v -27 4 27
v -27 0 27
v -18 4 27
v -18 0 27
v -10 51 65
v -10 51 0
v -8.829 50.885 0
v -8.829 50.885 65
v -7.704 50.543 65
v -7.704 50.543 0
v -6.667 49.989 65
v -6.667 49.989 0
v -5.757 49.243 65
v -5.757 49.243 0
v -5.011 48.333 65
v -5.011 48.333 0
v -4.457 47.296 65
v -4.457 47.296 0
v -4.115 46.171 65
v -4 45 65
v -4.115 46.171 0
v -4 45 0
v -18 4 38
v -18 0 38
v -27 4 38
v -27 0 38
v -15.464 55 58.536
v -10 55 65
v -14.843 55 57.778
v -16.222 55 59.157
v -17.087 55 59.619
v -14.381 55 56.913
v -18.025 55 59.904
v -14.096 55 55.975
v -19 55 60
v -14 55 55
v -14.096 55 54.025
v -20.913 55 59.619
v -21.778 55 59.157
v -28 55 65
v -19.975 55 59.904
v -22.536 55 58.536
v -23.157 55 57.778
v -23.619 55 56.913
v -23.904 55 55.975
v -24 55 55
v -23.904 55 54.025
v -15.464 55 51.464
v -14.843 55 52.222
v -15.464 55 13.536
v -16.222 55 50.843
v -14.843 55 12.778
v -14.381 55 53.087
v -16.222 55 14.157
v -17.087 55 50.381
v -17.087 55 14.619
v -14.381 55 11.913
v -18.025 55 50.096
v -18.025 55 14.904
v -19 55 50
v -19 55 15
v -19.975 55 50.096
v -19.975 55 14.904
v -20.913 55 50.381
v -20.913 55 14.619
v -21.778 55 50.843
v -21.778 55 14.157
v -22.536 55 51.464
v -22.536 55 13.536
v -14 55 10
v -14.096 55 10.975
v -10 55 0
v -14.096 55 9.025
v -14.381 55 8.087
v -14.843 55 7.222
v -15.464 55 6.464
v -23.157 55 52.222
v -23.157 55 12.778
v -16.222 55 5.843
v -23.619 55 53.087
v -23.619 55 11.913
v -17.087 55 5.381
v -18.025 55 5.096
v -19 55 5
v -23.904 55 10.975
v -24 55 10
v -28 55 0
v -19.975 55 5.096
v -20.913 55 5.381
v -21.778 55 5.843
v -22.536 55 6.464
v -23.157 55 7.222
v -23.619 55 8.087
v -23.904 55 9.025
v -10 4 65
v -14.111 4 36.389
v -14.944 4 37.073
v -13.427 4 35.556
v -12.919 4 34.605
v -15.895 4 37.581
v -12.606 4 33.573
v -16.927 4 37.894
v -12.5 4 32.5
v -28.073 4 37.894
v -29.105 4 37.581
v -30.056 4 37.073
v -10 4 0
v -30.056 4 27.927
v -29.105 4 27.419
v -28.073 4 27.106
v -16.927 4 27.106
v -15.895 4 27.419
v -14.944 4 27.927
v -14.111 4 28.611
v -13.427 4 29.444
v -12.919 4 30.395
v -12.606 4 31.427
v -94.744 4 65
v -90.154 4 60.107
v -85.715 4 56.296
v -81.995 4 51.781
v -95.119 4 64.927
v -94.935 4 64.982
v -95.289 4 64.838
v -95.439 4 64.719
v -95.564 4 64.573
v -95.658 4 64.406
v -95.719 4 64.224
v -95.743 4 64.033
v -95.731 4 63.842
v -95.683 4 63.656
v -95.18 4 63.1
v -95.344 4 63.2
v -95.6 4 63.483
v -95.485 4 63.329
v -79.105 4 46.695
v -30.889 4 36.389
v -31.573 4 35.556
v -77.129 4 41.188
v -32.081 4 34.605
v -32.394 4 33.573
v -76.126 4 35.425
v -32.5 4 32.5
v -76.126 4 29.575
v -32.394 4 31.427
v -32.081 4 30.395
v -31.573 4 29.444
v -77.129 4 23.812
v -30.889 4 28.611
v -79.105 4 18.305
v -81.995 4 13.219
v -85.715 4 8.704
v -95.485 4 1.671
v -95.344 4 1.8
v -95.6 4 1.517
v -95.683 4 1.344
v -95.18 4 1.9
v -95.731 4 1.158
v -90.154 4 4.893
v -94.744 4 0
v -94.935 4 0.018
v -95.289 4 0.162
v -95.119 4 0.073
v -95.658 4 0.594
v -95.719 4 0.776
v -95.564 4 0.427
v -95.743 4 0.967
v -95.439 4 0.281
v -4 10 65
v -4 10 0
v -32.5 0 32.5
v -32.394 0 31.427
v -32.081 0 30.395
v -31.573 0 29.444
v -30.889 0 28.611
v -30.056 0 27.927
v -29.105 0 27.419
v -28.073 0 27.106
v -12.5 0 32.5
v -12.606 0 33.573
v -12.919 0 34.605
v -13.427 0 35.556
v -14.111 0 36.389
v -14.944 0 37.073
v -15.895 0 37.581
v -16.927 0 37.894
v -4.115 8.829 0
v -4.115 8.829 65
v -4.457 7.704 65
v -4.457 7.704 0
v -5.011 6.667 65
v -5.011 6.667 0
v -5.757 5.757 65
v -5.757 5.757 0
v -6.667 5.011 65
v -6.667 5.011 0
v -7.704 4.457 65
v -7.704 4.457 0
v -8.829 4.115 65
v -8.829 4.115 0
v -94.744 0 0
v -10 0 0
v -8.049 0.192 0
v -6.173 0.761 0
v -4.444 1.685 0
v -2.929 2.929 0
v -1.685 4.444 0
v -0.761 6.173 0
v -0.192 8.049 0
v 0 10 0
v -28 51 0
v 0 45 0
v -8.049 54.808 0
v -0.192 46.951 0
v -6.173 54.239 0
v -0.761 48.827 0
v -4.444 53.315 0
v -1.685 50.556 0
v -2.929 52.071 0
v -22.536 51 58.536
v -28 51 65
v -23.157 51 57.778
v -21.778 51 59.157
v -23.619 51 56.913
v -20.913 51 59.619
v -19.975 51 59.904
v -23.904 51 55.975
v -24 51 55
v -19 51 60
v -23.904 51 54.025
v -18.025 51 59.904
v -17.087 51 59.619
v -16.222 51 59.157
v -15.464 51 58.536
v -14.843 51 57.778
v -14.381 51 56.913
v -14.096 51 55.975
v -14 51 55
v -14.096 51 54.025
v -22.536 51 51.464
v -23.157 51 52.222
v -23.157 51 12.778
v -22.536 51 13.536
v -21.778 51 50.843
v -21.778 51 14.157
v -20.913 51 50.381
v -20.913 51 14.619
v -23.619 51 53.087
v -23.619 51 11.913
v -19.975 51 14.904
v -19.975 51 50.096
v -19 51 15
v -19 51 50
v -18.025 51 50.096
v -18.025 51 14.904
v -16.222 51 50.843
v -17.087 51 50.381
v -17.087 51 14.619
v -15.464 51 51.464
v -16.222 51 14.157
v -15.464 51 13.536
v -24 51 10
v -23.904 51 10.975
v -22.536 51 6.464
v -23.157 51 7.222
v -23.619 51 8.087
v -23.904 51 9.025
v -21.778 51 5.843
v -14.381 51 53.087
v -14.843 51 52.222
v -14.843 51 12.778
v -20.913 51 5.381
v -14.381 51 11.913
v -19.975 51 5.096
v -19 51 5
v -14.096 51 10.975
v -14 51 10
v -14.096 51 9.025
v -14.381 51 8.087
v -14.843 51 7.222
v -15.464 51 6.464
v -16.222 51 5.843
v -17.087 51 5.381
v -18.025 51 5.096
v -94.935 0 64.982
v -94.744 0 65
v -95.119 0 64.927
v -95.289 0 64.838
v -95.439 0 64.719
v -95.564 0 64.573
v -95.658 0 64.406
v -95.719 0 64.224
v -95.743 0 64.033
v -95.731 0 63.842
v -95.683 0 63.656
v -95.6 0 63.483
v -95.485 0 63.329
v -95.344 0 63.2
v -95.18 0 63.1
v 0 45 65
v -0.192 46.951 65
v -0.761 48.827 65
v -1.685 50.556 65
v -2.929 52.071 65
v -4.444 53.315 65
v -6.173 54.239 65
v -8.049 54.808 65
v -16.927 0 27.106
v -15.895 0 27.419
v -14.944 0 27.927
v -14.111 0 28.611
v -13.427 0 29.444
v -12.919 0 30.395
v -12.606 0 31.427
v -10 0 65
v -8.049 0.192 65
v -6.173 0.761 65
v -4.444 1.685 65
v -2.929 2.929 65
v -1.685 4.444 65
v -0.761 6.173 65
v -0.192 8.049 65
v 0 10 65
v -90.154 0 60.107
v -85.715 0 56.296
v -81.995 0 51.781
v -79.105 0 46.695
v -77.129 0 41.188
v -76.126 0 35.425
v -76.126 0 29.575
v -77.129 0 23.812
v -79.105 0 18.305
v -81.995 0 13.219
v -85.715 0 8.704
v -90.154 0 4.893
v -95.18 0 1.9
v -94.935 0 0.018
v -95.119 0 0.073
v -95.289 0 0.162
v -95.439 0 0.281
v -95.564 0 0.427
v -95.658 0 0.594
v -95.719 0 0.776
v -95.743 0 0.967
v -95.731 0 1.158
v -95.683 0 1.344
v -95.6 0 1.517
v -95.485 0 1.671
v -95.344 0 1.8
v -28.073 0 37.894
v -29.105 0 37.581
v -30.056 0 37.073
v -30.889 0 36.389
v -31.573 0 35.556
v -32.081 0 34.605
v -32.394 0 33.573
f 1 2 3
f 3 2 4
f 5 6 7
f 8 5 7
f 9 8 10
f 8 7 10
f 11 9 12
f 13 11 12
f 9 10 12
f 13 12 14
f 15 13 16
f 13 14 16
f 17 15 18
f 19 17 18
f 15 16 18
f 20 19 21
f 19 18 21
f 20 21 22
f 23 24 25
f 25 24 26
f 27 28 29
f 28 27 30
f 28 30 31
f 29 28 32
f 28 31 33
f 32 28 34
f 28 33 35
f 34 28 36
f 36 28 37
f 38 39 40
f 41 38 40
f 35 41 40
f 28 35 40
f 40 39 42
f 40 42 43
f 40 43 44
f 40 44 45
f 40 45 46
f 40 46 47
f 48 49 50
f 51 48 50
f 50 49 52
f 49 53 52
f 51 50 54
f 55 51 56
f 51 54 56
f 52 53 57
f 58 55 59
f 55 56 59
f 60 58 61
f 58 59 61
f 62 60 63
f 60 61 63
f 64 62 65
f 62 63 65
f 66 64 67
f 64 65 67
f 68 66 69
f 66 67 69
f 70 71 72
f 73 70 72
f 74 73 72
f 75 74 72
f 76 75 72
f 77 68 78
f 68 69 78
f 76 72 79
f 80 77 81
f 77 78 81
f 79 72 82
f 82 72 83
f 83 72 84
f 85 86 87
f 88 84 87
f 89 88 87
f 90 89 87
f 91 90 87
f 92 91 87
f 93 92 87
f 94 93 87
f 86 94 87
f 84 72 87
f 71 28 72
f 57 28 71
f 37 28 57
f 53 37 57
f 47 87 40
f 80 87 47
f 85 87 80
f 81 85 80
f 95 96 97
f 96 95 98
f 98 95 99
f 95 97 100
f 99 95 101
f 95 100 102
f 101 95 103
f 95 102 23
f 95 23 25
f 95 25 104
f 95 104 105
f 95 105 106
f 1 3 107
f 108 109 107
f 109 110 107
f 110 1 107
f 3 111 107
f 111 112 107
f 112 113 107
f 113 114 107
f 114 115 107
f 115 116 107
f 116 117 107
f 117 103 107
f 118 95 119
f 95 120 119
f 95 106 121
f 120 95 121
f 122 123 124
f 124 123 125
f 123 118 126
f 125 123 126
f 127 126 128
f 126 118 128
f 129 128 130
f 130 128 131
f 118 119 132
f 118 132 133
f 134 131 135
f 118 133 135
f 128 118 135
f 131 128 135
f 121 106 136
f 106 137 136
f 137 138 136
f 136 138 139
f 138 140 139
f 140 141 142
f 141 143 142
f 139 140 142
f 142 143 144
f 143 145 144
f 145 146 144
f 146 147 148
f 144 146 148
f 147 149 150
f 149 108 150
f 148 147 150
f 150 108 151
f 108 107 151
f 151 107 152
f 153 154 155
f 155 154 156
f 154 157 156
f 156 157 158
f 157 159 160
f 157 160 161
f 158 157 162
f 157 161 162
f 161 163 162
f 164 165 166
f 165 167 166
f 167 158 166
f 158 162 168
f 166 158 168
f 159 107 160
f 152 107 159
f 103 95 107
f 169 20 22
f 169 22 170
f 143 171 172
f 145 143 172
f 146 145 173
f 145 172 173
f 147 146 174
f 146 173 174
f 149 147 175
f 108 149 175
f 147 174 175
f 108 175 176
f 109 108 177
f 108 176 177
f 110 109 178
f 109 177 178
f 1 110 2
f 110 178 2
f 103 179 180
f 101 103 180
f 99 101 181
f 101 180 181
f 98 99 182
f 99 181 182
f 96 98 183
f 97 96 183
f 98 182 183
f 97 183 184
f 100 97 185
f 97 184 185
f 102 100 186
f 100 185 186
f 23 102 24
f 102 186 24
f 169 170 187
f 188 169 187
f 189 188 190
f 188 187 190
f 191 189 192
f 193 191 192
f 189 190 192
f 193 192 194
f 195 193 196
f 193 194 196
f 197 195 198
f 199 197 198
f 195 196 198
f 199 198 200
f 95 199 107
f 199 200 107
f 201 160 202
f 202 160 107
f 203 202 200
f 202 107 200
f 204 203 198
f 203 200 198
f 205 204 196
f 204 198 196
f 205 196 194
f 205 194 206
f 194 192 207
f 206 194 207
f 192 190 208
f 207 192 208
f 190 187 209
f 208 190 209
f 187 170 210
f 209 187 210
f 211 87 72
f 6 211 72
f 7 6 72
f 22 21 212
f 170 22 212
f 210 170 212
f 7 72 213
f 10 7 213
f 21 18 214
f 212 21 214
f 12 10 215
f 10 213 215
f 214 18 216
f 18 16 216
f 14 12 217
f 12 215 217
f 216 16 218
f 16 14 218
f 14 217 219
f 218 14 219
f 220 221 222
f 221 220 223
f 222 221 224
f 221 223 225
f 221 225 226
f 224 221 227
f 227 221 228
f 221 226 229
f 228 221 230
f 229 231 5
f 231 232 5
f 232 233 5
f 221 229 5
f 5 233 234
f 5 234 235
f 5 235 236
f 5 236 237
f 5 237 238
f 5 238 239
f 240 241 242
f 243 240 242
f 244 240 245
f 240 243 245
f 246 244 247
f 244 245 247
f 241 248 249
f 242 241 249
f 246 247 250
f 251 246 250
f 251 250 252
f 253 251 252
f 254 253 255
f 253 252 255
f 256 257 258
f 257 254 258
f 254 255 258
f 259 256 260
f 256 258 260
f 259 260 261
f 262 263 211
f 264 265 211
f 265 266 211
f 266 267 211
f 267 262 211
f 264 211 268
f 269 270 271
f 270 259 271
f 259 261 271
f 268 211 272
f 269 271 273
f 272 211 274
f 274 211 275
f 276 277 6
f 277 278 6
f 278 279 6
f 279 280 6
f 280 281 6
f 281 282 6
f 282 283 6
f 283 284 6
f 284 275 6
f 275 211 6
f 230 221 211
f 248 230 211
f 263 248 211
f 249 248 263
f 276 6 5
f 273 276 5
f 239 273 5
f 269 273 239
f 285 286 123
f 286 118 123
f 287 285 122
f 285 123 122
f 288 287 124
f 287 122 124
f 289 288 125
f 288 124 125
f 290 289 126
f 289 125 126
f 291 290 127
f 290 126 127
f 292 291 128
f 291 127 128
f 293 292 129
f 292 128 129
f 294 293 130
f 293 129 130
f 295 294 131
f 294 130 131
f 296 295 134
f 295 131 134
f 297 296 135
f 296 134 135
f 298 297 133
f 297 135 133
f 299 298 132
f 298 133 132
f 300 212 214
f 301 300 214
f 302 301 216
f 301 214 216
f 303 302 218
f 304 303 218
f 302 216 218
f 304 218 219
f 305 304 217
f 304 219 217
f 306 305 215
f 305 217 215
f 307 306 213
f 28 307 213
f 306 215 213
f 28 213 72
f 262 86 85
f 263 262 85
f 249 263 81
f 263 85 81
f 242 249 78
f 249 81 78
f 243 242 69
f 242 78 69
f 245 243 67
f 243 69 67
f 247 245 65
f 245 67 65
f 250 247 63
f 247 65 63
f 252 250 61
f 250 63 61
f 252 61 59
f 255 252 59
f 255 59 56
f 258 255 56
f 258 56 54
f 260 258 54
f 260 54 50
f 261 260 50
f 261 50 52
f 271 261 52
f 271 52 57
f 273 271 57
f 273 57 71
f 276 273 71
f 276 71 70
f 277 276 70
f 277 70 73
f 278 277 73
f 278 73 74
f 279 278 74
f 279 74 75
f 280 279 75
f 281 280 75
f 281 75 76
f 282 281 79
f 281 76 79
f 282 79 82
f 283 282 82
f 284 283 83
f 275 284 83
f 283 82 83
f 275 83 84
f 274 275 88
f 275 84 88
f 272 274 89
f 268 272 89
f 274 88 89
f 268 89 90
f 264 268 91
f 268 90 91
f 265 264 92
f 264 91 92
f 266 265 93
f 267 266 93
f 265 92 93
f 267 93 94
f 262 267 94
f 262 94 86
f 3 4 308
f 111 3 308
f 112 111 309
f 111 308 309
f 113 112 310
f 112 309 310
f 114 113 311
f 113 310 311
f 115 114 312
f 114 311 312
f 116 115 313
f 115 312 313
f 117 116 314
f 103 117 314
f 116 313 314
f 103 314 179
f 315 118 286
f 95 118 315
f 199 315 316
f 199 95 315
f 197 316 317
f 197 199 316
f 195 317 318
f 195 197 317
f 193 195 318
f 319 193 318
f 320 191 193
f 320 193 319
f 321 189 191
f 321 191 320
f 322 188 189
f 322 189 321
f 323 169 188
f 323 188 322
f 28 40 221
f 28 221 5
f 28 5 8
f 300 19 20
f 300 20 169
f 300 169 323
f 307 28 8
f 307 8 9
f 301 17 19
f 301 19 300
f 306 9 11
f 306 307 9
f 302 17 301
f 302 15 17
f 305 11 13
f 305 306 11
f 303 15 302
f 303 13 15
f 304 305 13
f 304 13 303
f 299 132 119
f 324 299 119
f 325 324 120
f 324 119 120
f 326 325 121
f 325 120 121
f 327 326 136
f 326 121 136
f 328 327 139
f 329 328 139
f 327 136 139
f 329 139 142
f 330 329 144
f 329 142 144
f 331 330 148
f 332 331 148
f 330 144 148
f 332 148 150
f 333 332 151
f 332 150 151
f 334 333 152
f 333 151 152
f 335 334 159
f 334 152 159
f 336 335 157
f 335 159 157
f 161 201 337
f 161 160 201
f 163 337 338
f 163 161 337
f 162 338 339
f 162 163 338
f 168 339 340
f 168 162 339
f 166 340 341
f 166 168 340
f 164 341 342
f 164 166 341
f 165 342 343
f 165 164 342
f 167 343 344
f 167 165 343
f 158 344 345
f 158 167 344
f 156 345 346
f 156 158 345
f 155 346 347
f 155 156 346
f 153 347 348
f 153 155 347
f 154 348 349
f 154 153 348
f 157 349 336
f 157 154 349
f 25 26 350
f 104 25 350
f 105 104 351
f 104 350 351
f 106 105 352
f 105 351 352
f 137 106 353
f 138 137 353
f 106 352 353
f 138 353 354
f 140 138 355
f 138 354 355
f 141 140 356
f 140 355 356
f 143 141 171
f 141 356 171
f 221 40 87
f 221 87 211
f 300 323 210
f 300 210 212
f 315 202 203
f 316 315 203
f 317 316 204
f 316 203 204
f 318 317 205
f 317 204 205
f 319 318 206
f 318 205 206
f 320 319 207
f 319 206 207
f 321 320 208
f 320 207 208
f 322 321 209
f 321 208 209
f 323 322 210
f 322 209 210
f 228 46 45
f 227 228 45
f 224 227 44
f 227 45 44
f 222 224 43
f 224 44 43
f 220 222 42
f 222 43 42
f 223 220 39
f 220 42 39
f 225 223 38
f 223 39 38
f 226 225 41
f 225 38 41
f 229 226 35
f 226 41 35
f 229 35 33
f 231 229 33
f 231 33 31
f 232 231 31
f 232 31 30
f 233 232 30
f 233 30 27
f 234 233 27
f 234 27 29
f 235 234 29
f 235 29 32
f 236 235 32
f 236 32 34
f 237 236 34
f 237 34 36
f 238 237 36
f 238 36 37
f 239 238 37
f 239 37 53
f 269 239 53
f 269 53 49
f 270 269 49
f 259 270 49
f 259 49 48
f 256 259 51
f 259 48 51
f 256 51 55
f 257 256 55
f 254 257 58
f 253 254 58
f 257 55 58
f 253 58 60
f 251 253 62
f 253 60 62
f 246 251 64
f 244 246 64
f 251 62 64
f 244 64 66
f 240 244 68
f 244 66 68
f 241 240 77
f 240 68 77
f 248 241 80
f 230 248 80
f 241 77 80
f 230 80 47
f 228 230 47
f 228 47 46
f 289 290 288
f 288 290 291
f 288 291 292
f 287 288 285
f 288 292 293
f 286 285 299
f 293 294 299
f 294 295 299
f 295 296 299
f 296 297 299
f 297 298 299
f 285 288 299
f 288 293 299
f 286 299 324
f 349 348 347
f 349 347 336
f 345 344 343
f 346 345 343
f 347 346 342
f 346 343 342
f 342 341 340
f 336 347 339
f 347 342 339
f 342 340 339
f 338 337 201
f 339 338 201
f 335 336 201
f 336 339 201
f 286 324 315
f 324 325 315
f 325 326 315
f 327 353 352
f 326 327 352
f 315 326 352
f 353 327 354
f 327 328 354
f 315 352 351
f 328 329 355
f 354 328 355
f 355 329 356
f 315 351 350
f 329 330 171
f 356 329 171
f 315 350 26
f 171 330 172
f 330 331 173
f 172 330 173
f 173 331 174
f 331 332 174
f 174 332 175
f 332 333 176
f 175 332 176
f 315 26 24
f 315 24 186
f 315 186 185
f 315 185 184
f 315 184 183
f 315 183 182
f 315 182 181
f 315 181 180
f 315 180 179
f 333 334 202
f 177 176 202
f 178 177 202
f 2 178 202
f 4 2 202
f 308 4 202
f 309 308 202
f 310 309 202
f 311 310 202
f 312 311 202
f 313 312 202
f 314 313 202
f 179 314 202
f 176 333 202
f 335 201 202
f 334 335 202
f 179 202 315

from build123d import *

# Parameters (mm, degrees)
F1_DEPTH  = 65
F3_R      = 34
F4_DEPTH  = 25
F5_R      = 1
F7_R      = 5
F8_DEPTH  = 25
F11_DEPTH = 25


with BuildPart() as f1:
    # F0 (on Top) → F1 (new body)
    with BuildSketch(Plane.XY):
        with BuildLine():
            ThreePointArc((-10, 0), (-2.9289321881, 2.9289321881), (0, 10))
            Line((0, 10), (0, 45))
            ThreePointArc((0, 45), (-2.9289321881, 52.0710678119), (-10, 55))
            Line((-10, 55), (-28, 55))
            Line((-28, 55), (-28, 51))
            Line((-28, 51), (-10, 51))
            ThreePointArc((-10, 51), (-5.7573593129, 49.2426406871), (-4, 45))
            Line((-4, 45), (-4, 10))
            ThreePointArc((-4, 10), (-5.7573593129, 5.7573593129), (-10, 4))
            Line((-10, 4), (-110, 4))
            Line((-110, 4), (-110, 0))
            Line((-110, 0), (-10, 0))
        make_face()
    extrude(amount=F1_DEPTH)

    # F3 (on offset) → F4 (cut)
    with BuildSketch(Plane(origin=(0, 4, 0), x_dir=(-1, 0, 0), z_dir=(0, 1, 0))):
        with Locations((110, 32.5)):
            Circle(F3_R)
    extrude(amount=-F4_DEPTH, mode=Mode.SUBTRACT)

    # F5
    f5_edges = [f1.edges().sort_by_distance(p)[0] for p in [
        (-100.012508, 2, 65),
        (-100.012508, 2, 0),
    ]]
    fillet(f5_edges, radius=F5_R)

    # F7 (on offset) → F8 (cut)
    with BuildSketch(Plane(origin=(0, 55, 0), x_dir=(-1, 0, 0), z_dir=(0, 1, 0))):
        with Locations((19, 55)):
            Circle(F7_R)
        with Locations((19, 10)):
            Circle(F7_R)
    extrude(amount=-F8_DEPTH, mode=Mode.SUBTRACT)

    # F10 (on offset) → F11 (cut)
    with BuildSketch(Plane.XZ):
        with BuildLine():
            Line((-27, 27), (-18, 27))
            ThreePointArc((-18, 27), (-14.1109127035, 28.6109127035), (-12.5, 32.5))
            ThreePointArc((-12.5, 32.5), (-14.1109127035, 36.3890872965), (-18, 38))
            Line((-18, 38), (-27, 38))
            ThreePointArc((-27, 38), (-30.8890872965, 36.3890872965), (-32.5, 32.5))
            ThreePointArc((-32.5, 32.5), (-30.8890872965, 28.6109127035), (-27, 27))
        make_face()
    extrude(amount=-F11_DEPTH, mode=Mode.SUBTRACT)


solid = f1.part
